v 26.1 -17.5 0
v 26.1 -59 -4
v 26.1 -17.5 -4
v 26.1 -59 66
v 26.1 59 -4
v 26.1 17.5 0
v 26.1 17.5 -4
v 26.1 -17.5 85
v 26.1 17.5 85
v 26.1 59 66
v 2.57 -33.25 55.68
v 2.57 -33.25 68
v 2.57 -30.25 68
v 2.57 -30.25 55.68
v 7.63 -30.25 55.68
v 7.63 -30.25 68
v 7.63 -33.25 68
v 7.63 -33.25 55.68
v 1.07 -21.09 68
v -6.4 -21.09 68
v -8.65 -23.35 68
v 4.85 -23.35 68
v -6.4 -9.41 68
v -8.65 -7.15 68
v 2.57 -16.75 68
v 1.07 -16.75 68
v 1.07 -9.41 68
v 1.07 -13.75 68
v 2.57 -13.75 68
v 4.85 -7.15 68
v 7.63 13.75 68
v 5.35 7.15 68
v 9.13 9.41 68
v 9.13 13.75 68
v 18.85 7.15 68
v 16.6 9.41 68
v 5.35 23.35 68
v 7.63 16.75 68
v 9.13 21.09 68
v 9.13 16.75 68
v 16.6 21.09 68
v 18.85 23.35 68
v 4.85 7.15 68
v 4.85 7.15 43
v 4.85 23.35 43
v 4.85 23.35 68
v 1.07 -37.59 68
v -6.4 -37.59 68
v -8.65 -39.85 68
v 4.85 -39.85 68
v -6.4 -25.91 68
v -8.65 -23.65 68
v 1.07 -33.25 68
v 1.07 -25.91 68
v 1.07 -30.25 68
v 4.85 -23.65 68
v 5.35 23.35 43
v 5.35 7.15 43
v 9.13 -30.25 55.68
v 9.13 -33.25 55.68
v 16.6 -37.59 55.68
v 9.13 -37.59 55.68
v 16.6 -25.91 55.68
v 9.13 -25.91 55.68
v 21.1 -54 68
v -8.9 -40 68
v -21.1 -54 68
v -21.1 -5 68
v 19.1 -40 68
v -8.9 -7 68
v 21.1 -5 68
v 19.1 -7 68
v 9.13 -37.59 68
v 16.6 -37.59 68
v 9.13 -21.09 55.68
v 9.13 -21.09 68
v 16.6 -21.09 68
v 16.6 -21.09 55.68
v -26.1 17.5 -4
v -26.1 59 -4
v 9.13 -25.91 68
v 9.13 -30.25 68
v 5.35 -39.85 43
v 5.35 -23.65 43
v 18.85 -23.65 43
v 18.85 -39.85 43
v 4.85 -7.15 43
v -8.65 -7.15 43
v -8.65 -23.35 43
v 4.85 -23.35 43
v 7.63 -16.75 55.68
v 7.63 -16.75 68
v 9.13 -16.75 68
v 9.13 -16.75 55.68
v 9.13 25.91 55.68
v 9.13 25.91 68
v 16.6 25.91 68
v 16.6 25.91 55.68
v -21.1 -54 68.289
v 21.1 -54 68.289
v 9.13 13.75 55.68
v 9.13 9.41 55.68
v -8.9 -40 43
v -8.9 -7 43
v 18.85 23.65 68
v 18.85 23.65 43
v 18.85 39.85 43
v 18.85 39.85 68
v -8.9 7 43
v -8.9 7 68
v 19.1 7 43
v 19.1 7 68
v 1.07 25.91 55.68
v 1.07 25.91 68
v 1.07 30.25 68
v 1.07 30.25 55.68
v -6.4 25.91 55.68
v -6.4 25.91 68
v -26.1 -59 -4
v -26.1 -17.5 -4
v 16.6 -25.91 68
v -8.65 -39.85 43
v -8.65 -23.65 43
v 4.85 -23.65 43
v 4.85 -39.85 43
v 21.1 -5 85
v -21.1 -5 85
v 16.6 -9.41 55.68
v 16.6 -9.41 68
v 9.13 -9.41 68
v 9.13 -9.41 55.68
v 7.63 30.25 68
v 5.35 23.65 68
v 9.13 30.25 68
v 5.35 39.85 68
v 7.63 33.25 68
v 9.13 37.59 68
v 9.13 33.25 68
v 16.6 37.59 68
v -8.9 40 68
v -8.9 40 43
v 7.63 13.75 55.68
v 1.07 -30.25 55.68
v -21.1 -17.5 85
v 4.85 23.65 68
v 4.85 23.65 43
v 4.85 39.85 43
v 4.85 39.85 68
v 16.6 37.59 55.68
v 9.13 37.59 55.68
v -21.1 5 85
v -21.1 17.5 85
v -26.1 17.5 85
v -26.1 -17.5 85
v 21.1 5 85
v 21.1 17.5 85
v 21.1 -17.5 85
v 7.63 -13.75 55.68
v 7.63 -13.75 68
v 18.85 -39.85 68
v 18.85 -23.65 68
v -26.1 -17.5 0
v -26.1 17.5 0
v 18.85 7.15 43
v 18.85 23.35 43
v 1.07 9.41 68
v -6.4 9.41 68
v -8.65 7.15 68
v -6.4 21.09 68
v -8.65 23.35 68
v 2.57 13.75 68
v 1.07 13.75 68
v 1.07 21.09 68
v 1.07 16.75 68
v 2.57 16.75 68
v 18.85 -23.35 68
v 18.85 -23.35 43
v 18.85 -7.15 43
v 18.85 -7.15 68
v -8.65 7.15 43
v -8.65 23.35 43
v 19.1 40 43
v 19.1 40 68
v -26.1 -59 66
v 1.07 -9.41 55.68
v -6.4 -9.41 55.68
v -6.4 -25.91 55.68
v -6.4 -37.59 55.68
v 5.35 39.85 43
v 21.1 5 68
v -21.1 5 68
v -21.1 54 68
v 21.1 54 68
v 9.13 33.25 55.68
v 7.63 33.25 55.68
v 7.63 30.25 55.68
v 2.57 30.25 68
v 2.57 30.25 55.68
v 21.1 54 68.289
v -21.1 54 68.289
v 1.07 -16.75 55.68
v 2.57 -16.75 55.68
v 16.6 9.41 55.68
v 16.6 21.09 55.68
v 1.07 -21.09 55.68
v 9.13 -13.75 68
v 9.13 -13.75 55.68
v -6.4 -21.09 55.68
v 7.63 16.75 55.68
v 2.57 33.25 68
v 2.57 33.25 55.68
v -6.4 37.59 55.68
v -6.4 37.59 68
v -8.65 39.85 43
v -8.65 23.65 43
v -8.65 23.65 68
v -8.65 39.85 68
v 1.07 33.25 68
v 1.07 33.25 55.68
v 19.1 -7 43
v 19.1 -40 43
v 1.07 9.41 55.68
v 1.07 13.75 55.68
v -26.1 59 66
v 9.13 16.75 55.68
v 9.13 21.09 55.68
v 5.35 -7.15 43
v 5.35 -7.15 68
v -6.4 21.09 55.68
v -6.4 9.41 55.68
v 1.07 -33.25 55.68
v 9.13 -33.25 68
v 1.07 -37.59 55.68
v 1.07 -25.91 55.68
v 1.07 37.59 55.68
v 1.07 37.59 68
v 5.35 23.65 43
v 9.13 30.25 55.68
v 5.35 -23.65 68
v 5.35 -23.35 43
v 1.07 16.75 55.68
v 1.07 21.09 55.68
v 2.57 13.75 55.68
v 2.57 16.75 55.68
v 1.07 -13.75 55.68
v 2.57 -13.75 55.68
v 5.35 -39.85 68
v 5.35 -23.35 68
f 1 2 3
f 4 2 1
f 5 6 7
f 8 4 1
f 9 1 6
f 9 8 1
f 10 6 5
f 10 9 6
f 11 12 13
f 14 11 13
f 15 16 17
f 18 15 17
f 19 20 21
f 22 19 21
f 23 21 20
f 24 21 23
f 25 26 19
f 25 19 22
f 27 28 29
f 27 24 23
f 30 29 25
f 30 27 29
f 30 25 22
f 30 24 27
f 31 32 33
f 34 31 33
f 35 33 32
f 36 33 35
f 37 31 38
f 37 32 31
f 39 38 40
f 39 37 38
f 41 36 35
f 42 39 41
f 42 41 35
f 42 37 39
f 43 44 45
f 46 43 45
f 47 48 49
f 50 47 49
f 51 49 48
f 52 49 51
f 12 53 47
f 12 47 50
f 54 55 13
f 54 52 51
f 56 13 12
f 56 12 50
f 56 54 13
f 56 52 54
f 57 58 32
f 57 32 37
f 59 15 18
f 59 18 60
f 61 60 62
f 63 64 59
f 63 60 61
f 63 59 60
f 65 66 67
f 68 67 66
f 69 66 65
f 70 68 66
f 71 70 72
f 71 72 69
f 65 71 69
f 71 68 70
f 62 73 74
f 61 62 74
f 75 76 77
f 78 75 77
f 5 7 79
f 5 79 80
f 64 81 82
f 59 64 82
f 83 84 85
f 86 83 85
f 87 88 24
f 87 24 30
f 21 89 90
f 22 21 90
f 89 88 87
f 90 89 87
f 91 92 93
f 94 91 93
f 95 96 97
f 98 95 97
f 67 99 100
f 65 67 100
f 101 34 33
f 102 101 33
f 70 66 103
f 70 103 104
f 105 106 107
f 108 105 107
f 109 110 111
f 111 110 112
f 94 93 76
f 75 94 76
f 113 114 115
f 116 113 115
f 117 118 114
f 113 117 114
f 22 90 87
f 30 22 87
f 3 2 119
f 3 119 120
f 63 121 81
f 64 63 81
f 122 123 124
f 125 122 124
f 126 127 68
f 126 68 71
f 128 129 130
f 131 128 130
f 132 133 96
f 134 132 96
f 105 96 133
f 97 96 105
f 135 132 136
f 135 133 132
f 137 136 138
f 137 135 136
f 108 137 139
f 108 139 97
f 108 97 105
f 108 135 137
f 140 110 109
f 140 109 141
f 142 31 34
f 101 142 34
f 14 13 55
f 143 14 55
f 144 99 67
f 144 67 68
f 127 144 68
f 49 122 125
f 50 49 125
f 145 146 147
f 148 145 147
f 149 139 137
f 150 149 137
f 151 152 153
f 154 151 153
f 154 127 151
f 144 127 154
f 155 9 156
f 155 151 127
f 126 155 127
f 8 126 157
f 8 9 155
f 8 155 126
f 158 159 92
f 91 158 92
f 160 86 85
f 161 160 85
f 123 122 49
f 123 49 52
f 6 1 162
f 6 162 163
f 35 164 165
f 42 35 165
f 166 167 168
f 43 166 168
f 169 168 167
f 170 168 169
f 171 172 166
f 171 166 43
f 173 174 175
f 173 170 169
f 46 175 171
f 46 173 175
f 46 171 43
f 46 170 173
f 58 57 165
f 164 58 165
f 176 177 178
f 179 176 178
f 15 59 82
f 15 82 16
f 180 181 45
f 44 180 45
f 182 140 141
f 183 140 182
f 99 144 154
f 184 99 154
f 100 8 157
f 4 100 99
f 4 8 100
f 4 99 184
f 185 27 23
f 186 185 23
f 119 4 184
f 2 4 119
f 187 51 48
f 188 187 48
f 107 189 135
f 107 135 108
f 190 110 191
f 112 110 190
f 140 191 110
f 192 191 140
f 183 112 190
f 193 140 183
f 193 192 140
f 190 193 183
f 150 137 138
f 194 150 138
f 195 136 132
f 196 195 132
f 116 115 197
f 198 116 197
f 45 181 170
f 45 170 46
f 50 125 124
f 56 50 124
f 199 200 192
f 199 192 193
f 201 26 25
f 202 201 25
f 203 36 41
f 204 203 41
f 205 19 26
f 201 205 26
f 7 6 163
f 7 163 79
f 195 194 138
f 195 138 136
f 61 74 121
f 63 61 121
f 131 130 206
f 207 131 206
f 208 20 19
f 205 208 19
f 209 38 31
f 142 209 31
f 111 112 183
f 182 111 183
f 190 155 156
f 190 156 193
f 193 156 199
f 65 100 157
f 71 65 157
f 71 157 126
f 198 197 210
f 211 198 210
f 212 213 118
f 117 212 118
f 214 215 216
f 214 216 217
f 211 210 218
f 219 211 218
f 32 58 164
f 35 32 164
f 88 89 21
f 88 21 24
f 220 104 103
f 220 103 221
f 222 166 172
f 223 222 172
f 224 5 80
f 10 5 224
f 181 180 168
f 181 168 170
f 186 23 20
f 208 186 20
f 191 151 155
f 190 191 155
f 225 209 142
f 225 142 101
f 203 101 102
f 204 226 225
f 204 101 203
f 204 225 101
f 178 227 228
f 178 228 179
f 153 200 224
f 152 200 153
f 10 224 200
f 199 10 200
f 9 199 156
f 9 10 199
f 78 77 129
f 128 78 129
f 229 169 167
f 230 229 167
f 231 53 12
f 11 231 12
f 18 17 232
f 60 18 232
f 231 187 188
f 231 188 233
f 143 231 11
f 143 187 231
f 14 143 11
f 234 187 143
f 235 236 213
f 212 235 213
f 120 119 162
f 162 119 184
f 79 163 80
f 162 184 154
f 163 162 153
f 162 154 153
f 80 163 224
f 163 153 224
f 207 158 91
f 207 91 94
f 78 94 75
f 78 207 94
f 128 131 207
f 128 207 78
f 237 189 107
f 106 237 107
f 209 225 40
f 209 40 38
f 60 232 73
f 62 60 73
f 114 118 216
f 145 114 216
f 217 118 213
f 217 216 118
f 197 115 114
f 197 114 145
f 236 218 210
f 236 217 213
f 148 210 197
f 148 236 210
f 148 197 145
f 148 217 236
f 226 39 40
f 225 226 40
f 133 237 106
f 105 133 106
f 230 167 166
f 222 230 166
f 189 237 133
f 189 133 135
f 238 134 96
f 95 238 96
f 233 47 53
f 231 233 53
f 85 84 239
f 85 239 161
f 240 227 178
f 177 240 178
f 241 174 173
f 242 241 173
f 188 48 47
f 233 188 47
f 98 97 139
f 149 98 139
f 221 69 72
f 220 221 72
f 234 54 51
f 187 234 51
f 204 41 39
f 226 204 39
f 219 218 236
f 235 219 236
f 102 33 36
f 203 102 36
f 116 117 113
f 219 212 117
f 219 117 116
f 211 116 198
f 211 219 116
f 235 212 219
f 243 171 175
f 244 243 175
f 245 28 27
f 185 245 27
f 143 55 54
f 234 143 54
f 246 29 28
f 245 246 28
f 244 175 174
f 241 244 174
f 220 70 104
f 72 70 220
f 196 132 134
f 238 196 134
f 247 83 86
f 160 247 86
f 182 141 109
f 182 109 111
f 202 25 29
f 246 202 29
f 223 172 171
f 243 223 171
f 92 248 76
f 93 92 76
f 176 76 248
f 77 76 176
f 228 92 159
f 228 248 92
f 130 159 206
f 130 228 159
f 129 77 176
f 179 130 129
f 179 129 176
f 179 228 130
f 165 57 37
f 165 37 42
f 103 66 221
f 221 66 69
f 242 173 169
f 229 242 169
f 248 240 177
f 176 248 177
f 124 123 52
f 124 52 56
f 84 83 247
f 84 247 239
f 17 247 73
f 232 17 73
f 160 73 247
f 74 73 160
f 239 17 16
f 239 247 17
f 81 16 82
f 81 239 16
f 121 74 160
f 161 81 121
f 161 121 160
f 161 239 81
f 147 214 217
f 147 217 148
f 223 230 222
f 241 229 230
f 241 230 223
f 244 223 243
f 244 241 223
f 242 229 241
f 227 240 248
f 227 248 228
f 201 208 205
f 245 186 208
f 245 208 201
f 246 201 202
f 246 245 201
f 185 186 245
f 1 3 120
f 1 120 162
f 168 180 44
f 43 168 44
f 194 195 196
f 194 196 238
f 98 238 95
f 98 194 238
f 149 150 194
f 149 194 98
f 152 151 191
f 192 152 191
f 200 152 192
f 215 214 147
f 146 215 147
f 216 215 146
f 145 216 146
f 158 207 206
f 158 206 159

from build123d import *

# Parameters (mm, degrees)
F1_DEPTH = 26.1
F2_W     = 42.2
F2_H     = 49
F3_DEPTH = 17
F4_W     = 28
F4_H     = 33
F5_DEPTH = 25
F6_W     = 13.5
F6_H     = 16.2
F7_DEPTH = 25
F9_DEPTH = 12.32


with BuildPart() as f1:
    # F0 (on Right) → F1 (new body, symmetric)
    with BuildSketch(Plane.YZ):
        Polygon((-59, 66), (-59, -4), (-17.5, -4), (-17.5, 0), (17.5, 0), (17.5, -4), (59, -4), (59, 66), (17.5, 85), (-17.5, 85), align=None)
    extrude(amount=F1_DEPTH, both=True)

    # F2 (on face) → F3 (cut)
    with BuildSketch(Plane.XY.offset(85)):
        with Locations((0, -29.5)):
            Rectangle(F2_W, F2_H)
        with Locations((0, 29.5)):
            Rectangle(F2_W, F2_H)
    extrude(amount=-F3_DEPTH, mode=Mode.SUBTRACT)

    # F4 (on face) → F5 (cut)
    with BuildSketch(Plane.XY.offset(68)):
        with Locations((5.1, -23.5)):
            Rectangle(F4_W, F4_H)
        with Locations((5.1, 23.5)):
            Rectangle(F4_W, F4_H)
    extrude(amount=-F5_DEPTH, mode=Mode.SUBTRACT)


with BuildPart() as f7:
    # F6 (on face) → F7 (new body)
    with BuildSketch(Plane.XY.offset(43)):
        with Locations((12.1, -31.75)):
            Rectangle(F6_W, F6_H)
        with Locations((-1.9, -31.75)):
            Rectangle(F6_W, F6_H)
        with Locations((-1.9, -15.25)):
            Rectangle(F6_W, F6_H)
        with Locations((12.1, -15.25)):
            Rectangle(F6_W, F6_H)
        with Locations((-1.9, 15.25)):
            Rectangle(F6_W, F6_H)
        with Locations((12.1, 15.25)):
            Rectangle(F6_W, F6_H)
        with Locations((-1.9, 31.75)):
            Rectangle(F6_W, F6_H)
        with Locations((12.1, 31.75)):
            Rectangle(F6_W, F6_H)
    extrude(amount=F7_DEPTH)

    # F8 (on face) → F9 (cut)
    with BuildSketch(Plane.XY.offset(68)):
        Polygon((9.13, -37.59), (16.6, -37.59), (16.6, -25.91), (9.13, -25.91), (9.13, -30.25), (7.63, -30.25), (7.63, -33.25), (9.13, -33.25), align=None)
        Polygon((1.07, -37.59), (1.07, -33.25), (2.57, -33.25), (2.57, -30.25), (1.07, -30.25), (1.07, -25.91), (-6.4, -25.91), (-6.4, -37.59), align=None)
        Polygon((2.57, -13.75), (1.07, -13.75), (1.07, -9.41), (-6.4, -9.41), (-6.4, -21.09), (1.07, -21.09), (1.07, -16.75), (2.57, -16.75), align=None)
        Polygon((9.13, -9.41), (9.13, -13.75), (7.63, -13.75), (7.63, -16.75), (9.13, -16.75), (9.13, -21.09), (16.6, -21.09), (16.6, -9.41), align=None)
        Polygon((1.07, 21.09), (-6.4, 21.09), (-6.4, 9.41), (1.07, 9.41), (1.07, 13.75), (2.57, 13.75), (2.57, 16.75), (1.07, 16.75), align=None)
        Polygon((16.6, 21.09), (9.13, 21.09), (9.13, 16.75), (7.63, 16.75), (7.63, 13.75), (9.13, 13.75), (9.13, 9.41), (16.6, 9.41), align=None)
        Polygon((2.57, 33.25), (1.07, 33.25), (1.07, 37.59), (-6.4, 37.59), (-6.4, 25.91), (1.07, 25.91), (1.07, 30.25), (2.57, 30.25), align=None)
        Polygon((9.13, 37.59), (9.13, 33.25), (7.63, 33.25), (7.63, 30.25), (9.13, 30.25), (9.13, 25.91), (16.6, 25.91), (16.6, 37.59), align=None)
    extrude(amount=-F9_DEPTH, mode=Mode.SUBTRACT)


solid = Compound([f1.part, f7.part])
